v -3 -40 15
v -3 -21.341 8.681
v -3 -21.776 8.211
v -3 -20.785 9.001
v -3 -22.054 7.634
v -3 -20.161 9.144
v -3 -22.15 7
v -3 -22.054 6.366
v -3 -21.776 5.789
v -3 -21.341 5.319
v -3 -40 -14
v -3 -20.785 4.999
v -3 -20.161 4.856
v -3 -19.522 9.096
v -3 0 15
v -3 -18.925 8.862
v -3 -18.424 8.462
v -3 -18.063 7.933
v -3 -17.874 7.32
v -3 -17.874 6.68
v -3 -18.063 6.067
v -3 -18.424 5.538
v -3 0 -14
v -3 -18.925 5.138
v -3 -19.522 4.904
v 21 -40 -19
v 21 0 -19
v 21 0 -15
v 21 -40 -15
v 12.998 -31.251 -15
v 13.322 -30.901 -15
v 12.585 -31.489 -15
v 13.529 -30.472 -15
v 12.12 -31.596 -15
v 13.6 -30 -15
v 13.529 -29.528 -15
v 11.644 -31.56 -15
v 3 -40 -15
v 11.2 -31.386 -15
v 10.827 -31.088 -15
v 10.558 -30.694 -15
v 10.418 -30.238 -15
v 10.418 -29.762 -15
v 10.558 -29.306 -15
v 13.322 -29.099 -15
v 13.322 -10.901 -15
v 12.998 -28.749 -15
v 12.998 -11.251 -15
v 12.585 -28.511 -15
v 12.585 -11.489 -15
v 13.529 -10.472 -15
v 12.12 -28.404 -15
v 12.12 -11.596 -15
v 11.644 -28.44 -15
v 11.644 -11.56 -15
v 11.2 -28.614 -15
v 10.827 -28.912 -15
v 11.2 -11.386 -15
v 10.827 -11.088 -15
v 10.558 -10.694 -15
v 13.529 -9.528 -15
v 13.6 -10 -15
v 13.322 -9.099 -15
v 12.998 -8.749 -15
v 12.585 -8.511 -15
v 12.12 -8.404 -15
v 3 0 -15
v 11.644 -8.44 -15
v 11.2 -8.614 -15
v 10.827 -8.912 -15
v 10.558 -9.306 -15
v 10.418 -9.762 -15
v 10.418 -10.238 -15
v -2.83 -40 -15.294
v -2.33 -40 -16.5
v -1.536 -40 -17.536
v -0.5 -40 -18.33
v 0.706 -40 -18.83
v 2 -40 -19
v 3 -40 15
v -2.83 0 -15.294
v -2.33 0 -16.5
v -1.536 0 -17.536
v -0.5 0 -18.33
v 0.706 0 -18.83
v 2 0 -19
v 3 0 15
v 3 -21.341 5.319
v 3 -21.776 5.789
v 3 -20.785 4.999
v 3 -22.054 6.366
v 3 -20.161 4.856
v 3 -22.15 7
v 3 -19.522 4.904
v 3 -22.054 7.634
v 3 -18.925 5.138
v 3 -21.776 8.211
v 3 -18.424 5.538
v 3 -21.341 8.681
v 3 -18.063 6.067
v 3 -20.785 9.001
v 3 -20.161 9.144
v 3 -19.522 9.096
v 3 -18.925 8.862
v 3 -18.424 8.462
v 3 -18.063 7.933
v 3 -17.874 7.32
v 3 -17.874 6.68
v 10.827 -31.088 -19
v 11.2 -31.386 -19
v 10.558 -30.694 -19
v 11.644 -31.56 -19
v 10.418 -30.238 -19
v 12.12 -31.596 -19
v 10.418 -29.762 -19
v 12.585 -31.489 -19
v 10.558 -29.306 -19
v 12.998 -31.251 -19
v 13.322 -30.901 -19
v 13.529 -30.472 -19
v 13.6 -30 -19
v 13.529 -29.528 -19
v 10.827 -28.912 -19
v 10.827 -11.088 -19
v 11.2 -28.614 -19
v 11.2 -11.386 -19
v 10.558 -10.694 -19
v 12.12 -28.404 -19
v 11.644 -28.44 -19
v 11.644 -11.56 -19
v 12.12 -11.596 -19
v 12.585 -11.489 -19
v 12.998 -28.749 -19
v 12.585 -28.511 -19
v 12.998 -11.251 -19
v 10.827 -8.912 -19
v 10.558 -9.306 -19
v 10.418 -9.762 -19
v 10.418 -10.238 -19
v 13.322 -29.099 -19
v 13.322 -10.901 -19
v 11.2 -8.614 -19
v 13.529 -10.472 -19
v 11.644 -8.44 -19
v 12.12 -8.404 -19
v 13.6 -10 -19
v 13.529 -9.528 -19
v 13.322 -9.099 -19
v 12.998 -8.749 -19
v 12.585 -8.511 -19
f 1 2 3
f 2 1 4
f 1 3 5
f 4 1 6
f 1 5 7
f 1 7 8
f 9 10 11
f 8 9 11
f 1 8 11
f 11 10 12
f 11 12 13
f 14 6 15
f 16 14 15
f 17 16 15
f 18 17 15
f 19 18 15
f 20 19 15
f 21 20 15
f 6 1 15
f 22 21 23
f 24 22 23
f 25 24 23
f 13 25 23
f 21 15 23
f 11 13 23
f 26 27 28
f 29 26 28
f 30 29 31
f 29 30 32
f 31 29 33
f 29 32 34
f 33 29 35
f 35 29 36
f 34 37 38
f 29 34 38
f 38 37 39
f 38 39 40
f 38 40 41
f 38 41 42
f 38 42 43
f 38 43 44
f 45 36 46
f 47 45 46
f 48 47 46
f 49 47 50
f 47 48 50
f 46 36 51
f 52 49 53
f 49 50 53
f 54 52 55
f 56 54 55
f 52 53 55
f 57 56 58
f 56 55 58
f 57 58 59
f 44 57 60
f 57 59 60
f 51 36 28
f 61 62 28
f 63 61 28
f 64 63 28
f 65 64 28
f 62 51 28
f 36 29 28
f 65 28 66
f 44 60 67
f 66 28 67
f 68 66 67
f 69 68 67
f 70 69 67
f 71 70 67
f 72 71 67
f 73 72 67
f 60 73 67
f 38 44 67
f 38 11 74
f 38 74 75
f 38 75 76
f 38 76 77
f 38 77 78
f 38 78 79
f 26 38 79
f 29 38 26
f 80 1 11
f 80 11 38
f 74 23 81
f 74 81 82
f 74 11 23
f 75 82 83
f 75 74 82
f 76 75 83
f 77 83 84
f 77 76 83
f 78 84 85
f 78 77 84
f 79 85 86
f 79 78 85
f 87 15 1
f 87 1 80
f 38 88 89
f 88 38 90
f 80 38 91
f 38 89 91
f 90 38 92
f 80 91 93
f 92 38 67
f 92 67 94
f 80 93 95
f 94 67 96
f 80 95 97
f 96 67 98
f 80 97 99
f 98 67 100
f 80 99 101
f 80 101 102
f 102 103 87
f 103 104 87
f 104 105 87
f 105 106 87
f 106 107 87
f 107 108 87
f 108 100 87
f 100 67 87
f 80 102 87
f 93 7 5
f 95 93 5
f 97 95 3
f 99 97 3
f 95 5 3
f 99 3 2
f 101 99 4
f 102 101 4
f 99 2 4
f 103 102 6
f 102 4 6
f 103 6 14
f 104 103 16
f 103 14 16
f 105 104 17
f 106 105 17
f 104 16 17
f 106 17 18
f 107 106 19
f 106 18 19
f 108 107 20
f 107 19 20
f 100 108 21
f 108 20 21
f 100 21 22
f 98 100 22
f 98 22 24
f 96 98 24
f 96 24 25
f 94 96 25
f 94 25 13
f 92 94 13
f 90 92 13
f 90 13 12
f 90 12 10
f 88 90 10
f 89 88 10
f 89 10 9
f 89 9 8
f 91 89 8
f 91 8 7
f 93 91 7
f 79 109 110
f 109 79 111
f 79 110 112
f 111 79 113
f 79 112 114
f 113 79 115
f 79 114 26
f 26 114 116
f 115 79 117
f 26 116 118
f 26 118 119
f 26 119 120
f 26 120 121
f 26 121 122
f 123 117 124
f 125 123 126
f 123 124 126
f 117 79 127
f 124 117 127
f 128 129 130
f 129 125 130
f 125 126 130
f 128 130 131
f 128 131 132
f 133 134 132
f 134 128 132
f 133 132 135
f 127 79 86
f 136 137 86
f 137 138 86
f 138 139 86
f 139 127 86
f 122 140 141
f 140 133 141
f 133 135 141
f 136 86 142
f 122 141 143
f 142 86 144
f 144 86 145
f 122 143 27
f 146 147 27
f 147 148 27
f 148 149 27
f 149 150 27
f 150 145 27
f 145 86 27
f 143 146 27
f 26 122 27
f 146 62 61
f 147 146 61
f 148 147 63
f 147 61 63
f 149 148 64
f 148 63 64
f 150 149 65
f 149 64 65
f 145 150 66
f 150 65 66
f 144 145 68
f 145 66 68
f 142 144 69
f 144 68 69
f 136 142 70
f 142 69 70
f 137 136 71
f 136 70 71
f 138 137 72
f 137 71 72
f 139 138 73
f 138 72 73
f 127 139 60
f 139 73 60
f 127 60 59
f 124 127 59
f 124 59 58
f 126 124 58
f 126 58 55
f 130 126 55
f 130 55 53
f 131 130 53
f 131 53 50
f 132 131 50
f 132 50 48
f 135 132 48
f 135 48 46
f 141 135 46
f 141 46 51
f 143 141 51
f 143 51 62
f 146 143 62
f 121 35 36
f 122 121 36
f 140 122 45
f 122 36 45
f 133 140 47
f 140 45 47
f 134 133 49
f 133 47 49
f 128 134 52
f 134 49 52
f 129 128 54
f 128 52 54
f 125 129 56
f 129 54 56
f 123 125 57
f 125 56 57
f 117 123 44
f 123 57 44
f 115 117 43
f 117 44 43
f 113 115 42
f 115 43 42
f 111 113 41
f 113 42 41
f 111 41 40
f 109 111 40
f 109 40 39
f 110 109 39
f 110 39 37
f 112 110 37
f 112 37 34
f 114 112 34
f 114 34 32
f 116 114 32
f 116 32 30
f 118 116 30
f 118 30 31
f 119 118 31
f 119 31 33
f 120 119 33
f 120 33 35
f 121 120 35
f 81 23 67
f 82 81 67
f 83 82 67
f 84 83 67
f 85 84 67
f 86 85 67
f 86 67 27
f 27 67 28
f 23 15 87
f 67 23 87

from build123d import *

# Parameters (mm, degrees)
F0_W     = 6
F0_H     = 30
F1_DEPTH = 40
F2_R     = 5
F3_R     = 2.15
F4_DEPTH = 25
F5_R     = 1.6
F6_DEPTH = 25


with BuildPart() as f1:
    # F0 (on Front) → F1 (new body)
    with BuildSketch(Plane.XZ):
        Polygon((21, -15), (3, -15), (-3, -15), (-3, -19), (21, -19), align=None)
        Rectangle(F0_W, F0_H)
    extrude(amount=F1_DEPTH)

    # F2
    f2_edges = [f1.edges().sort_by_distance(p)[0] for p in [
        (-3, -20, -19),
    ]]
    fillet(f2_edges, radius=F2_R)

    # F3 (on face) → F4 (cut)
    with BuildSketch(Plane(origin=(-3, 0, 0), x_dir=(0, -1, 0), z_dir=(-1, 0, 0))):
        with Locations((20, 7)):
            Circle(F3_R)
    extrude(amount=-F4_DEPTH, mode=Mode.SUBTRACT)

    # F5 (on face) → F6 (cut)
    with BuildSketch(Plane.XY.offset(-15)):
        with Locations((12, -10)):
            Circle(F5_R)
        with Locations((12, -30)):
            Circle(F5_R)
    extrude(amount=-F6_DEPTH, mode=Mode.SUBTRACT)


solid = f1.part
